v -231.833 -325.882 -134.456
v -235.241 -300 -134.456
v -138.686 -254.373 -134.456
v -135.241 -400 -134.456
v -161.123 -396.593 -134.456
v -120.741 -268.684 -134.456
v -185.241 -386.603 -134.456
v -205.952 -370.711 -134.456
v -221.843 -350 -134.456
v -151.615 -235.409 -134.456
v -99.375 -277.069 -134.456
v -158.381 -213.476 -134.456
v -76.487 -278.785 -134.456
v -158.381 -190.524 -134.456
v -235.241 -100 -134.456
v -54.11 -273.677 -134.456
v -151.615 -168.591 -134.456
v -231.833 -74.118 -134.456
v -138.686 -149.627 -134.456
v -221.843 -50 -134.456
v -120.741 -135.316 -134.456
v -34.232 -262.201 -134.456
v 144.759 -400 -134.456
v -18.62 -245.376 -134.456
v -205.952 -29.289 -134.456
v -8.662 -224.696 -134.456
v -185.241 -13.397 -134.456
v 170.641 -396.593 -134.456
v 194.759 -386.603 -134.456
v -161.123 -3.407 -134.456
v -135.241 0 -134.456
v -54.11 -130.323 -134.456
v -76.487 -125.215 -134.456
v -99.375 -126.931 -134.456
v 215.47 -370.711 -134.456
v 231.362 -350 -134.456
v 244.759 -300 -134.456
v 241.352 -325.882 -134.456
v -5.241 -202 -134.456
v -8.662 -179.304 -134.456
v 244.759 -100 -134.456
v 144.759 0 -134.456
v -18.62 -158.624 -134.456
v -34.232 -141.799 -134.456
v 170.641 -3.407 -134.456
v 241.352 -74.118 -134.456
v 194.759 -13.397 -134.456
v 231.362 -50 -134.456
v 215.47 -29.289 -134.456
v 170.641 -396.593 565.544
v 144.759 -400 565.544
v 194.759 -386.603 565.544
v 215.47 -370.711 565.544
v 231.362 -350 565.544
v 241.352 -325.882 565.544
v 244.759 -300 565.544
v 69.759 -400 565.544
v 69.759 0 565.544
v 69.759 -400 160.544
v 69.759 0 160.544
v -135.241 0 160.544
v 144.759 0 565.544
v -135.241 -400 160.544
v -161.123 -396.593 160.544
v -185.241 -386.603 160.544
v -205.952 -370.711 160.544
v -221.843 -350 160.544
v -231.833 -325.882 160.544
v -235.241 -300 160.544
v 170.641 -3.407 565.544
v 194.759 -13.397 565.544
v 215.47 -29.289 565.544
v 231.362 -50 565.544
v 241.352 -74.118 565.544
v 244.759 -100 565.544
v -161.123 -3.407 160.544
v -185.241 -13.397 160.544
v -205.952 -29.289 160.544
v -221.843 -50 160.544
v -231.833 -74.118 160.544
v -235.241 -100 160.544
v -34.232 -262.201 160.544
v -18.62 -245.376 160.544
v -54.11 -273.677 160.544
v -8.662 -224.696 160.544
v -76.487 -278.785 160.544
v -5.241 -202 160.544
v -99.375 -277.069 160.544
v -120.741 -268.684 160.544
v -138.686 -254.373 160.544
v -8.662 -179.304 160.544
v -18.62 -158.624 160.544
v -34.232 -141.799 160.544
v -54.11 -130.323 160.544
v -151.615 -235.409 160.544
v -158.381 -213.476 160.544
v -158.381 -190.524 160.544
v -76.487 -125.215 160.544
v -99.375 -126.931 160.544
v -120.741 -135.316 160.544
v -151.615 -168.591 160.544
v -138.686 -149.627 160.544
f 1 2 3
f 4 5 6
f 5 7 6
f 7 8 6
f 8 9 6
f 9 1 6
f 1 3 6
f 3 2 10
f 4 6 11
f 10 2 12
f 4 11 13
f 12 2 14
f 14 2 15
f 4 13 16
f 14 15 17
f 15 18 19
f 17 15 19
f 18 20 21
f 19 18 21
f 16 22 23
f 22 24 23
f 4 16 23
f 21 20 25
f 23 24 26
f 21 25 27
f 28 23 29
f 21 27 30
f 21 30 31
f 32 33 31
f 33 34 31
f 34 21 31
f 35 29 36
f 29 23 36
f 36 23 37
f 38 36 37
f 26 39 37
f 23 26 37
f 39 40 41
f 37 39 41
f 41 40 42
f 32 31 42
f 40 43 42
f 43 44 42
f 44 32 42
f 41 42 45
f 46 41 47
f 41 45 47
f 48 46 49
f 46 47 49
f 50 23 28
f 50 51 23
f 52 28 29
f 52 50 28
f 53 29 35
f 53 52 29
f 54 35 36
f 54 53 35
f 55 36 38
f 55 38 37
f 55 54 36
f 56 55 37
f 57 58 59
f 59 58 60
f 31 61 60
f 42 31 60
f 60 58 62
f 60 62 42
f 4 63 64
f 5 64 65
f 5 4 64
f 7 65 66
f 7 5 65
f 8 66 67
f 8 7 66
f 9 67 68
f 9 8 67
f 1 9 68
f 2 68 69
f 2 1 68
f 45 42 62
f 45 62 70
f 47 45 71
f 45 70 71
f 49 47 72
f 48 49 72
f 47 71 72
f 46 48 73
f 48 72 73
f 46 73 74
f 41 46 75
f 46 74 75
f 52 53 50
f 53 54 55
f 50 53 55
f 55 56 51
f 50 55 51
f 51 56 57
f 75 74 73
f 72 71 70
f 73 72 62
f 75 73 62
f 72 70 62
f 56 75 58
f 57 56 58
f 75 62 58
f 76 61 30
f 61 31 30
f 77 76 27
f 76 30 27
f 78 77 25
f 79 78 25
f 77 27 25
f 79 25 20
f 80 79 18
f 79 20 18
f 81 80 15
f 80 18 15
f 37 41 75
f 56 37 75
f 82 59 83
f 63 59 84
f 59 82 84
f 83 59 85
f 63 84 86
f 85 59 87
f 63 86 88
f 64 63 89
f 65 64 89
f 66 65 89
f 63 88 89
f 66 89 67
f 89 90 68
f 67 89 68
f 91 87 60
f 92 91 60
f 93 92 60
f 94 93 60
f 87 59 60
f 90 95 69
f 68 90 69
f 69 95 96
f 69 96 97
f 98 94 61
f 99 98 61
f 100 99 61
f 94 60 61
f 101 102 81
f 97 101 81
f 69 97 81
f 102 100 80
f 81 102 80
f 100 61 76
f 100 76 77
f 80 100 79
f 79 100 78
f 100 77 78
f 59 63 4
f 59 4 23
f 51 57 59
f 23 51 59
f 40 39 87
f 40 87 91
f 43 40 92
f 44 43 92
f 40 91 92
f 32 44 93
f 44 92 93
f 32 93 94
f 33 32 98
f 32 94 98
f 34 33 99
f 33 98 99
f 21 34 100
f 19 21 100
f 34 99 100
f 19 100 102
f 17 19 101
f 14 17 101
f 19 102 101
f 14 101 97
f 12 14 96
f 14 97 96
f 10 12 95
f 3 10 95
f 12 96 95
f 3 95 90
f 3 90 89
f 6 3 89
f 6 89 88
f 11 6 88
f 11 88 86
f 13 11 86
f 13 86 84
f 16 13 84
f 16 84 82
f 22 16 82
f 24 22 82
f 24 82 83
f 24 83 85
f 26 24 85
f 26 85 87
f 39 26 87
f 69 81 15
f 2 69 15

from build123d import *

# Parameters (mm, degrees)
F1_DEPTH = 400
F2_R     = 77
F3_DEPTH = 295.001
F4_R     = 100


with BuildPart() as f1:
    # F0 (on Front) → F1 (new body)
    with BuildSketch(Plane.XZ):
        Polygon((69.759124, 160.54423), (-235.240876, 160.54423), (-235.240876, -134.45577), (244.759124, -134.45577), (244.759124, 565.54423), (69.759124, 565.54423), align=None)
    extrude(amount=F1_DEPTH)

    # F2 (on face) → F3 (cut, through all)
    with BuildSketch(Plane.XY.offset(160.54423)):
        with Locations((-82.240876, -202)):
            Circle(F2_R)
    extrude(amount=-F3_DEPTH, mode=Mode.SUBTRACT)

    # F4
    f4_edges = [f1.edges().sort_by_distance(p)[0] for p in [
        (-235.240876, 0, 13.04423),
        (-235.240876, -400, 13.04423),
        (244.759124, -400, 215.54423),
        (244.759124, 0, 215.54423),
    ]]
    fillet(f4_edges, radius=F4_R)


solid = f1.part
